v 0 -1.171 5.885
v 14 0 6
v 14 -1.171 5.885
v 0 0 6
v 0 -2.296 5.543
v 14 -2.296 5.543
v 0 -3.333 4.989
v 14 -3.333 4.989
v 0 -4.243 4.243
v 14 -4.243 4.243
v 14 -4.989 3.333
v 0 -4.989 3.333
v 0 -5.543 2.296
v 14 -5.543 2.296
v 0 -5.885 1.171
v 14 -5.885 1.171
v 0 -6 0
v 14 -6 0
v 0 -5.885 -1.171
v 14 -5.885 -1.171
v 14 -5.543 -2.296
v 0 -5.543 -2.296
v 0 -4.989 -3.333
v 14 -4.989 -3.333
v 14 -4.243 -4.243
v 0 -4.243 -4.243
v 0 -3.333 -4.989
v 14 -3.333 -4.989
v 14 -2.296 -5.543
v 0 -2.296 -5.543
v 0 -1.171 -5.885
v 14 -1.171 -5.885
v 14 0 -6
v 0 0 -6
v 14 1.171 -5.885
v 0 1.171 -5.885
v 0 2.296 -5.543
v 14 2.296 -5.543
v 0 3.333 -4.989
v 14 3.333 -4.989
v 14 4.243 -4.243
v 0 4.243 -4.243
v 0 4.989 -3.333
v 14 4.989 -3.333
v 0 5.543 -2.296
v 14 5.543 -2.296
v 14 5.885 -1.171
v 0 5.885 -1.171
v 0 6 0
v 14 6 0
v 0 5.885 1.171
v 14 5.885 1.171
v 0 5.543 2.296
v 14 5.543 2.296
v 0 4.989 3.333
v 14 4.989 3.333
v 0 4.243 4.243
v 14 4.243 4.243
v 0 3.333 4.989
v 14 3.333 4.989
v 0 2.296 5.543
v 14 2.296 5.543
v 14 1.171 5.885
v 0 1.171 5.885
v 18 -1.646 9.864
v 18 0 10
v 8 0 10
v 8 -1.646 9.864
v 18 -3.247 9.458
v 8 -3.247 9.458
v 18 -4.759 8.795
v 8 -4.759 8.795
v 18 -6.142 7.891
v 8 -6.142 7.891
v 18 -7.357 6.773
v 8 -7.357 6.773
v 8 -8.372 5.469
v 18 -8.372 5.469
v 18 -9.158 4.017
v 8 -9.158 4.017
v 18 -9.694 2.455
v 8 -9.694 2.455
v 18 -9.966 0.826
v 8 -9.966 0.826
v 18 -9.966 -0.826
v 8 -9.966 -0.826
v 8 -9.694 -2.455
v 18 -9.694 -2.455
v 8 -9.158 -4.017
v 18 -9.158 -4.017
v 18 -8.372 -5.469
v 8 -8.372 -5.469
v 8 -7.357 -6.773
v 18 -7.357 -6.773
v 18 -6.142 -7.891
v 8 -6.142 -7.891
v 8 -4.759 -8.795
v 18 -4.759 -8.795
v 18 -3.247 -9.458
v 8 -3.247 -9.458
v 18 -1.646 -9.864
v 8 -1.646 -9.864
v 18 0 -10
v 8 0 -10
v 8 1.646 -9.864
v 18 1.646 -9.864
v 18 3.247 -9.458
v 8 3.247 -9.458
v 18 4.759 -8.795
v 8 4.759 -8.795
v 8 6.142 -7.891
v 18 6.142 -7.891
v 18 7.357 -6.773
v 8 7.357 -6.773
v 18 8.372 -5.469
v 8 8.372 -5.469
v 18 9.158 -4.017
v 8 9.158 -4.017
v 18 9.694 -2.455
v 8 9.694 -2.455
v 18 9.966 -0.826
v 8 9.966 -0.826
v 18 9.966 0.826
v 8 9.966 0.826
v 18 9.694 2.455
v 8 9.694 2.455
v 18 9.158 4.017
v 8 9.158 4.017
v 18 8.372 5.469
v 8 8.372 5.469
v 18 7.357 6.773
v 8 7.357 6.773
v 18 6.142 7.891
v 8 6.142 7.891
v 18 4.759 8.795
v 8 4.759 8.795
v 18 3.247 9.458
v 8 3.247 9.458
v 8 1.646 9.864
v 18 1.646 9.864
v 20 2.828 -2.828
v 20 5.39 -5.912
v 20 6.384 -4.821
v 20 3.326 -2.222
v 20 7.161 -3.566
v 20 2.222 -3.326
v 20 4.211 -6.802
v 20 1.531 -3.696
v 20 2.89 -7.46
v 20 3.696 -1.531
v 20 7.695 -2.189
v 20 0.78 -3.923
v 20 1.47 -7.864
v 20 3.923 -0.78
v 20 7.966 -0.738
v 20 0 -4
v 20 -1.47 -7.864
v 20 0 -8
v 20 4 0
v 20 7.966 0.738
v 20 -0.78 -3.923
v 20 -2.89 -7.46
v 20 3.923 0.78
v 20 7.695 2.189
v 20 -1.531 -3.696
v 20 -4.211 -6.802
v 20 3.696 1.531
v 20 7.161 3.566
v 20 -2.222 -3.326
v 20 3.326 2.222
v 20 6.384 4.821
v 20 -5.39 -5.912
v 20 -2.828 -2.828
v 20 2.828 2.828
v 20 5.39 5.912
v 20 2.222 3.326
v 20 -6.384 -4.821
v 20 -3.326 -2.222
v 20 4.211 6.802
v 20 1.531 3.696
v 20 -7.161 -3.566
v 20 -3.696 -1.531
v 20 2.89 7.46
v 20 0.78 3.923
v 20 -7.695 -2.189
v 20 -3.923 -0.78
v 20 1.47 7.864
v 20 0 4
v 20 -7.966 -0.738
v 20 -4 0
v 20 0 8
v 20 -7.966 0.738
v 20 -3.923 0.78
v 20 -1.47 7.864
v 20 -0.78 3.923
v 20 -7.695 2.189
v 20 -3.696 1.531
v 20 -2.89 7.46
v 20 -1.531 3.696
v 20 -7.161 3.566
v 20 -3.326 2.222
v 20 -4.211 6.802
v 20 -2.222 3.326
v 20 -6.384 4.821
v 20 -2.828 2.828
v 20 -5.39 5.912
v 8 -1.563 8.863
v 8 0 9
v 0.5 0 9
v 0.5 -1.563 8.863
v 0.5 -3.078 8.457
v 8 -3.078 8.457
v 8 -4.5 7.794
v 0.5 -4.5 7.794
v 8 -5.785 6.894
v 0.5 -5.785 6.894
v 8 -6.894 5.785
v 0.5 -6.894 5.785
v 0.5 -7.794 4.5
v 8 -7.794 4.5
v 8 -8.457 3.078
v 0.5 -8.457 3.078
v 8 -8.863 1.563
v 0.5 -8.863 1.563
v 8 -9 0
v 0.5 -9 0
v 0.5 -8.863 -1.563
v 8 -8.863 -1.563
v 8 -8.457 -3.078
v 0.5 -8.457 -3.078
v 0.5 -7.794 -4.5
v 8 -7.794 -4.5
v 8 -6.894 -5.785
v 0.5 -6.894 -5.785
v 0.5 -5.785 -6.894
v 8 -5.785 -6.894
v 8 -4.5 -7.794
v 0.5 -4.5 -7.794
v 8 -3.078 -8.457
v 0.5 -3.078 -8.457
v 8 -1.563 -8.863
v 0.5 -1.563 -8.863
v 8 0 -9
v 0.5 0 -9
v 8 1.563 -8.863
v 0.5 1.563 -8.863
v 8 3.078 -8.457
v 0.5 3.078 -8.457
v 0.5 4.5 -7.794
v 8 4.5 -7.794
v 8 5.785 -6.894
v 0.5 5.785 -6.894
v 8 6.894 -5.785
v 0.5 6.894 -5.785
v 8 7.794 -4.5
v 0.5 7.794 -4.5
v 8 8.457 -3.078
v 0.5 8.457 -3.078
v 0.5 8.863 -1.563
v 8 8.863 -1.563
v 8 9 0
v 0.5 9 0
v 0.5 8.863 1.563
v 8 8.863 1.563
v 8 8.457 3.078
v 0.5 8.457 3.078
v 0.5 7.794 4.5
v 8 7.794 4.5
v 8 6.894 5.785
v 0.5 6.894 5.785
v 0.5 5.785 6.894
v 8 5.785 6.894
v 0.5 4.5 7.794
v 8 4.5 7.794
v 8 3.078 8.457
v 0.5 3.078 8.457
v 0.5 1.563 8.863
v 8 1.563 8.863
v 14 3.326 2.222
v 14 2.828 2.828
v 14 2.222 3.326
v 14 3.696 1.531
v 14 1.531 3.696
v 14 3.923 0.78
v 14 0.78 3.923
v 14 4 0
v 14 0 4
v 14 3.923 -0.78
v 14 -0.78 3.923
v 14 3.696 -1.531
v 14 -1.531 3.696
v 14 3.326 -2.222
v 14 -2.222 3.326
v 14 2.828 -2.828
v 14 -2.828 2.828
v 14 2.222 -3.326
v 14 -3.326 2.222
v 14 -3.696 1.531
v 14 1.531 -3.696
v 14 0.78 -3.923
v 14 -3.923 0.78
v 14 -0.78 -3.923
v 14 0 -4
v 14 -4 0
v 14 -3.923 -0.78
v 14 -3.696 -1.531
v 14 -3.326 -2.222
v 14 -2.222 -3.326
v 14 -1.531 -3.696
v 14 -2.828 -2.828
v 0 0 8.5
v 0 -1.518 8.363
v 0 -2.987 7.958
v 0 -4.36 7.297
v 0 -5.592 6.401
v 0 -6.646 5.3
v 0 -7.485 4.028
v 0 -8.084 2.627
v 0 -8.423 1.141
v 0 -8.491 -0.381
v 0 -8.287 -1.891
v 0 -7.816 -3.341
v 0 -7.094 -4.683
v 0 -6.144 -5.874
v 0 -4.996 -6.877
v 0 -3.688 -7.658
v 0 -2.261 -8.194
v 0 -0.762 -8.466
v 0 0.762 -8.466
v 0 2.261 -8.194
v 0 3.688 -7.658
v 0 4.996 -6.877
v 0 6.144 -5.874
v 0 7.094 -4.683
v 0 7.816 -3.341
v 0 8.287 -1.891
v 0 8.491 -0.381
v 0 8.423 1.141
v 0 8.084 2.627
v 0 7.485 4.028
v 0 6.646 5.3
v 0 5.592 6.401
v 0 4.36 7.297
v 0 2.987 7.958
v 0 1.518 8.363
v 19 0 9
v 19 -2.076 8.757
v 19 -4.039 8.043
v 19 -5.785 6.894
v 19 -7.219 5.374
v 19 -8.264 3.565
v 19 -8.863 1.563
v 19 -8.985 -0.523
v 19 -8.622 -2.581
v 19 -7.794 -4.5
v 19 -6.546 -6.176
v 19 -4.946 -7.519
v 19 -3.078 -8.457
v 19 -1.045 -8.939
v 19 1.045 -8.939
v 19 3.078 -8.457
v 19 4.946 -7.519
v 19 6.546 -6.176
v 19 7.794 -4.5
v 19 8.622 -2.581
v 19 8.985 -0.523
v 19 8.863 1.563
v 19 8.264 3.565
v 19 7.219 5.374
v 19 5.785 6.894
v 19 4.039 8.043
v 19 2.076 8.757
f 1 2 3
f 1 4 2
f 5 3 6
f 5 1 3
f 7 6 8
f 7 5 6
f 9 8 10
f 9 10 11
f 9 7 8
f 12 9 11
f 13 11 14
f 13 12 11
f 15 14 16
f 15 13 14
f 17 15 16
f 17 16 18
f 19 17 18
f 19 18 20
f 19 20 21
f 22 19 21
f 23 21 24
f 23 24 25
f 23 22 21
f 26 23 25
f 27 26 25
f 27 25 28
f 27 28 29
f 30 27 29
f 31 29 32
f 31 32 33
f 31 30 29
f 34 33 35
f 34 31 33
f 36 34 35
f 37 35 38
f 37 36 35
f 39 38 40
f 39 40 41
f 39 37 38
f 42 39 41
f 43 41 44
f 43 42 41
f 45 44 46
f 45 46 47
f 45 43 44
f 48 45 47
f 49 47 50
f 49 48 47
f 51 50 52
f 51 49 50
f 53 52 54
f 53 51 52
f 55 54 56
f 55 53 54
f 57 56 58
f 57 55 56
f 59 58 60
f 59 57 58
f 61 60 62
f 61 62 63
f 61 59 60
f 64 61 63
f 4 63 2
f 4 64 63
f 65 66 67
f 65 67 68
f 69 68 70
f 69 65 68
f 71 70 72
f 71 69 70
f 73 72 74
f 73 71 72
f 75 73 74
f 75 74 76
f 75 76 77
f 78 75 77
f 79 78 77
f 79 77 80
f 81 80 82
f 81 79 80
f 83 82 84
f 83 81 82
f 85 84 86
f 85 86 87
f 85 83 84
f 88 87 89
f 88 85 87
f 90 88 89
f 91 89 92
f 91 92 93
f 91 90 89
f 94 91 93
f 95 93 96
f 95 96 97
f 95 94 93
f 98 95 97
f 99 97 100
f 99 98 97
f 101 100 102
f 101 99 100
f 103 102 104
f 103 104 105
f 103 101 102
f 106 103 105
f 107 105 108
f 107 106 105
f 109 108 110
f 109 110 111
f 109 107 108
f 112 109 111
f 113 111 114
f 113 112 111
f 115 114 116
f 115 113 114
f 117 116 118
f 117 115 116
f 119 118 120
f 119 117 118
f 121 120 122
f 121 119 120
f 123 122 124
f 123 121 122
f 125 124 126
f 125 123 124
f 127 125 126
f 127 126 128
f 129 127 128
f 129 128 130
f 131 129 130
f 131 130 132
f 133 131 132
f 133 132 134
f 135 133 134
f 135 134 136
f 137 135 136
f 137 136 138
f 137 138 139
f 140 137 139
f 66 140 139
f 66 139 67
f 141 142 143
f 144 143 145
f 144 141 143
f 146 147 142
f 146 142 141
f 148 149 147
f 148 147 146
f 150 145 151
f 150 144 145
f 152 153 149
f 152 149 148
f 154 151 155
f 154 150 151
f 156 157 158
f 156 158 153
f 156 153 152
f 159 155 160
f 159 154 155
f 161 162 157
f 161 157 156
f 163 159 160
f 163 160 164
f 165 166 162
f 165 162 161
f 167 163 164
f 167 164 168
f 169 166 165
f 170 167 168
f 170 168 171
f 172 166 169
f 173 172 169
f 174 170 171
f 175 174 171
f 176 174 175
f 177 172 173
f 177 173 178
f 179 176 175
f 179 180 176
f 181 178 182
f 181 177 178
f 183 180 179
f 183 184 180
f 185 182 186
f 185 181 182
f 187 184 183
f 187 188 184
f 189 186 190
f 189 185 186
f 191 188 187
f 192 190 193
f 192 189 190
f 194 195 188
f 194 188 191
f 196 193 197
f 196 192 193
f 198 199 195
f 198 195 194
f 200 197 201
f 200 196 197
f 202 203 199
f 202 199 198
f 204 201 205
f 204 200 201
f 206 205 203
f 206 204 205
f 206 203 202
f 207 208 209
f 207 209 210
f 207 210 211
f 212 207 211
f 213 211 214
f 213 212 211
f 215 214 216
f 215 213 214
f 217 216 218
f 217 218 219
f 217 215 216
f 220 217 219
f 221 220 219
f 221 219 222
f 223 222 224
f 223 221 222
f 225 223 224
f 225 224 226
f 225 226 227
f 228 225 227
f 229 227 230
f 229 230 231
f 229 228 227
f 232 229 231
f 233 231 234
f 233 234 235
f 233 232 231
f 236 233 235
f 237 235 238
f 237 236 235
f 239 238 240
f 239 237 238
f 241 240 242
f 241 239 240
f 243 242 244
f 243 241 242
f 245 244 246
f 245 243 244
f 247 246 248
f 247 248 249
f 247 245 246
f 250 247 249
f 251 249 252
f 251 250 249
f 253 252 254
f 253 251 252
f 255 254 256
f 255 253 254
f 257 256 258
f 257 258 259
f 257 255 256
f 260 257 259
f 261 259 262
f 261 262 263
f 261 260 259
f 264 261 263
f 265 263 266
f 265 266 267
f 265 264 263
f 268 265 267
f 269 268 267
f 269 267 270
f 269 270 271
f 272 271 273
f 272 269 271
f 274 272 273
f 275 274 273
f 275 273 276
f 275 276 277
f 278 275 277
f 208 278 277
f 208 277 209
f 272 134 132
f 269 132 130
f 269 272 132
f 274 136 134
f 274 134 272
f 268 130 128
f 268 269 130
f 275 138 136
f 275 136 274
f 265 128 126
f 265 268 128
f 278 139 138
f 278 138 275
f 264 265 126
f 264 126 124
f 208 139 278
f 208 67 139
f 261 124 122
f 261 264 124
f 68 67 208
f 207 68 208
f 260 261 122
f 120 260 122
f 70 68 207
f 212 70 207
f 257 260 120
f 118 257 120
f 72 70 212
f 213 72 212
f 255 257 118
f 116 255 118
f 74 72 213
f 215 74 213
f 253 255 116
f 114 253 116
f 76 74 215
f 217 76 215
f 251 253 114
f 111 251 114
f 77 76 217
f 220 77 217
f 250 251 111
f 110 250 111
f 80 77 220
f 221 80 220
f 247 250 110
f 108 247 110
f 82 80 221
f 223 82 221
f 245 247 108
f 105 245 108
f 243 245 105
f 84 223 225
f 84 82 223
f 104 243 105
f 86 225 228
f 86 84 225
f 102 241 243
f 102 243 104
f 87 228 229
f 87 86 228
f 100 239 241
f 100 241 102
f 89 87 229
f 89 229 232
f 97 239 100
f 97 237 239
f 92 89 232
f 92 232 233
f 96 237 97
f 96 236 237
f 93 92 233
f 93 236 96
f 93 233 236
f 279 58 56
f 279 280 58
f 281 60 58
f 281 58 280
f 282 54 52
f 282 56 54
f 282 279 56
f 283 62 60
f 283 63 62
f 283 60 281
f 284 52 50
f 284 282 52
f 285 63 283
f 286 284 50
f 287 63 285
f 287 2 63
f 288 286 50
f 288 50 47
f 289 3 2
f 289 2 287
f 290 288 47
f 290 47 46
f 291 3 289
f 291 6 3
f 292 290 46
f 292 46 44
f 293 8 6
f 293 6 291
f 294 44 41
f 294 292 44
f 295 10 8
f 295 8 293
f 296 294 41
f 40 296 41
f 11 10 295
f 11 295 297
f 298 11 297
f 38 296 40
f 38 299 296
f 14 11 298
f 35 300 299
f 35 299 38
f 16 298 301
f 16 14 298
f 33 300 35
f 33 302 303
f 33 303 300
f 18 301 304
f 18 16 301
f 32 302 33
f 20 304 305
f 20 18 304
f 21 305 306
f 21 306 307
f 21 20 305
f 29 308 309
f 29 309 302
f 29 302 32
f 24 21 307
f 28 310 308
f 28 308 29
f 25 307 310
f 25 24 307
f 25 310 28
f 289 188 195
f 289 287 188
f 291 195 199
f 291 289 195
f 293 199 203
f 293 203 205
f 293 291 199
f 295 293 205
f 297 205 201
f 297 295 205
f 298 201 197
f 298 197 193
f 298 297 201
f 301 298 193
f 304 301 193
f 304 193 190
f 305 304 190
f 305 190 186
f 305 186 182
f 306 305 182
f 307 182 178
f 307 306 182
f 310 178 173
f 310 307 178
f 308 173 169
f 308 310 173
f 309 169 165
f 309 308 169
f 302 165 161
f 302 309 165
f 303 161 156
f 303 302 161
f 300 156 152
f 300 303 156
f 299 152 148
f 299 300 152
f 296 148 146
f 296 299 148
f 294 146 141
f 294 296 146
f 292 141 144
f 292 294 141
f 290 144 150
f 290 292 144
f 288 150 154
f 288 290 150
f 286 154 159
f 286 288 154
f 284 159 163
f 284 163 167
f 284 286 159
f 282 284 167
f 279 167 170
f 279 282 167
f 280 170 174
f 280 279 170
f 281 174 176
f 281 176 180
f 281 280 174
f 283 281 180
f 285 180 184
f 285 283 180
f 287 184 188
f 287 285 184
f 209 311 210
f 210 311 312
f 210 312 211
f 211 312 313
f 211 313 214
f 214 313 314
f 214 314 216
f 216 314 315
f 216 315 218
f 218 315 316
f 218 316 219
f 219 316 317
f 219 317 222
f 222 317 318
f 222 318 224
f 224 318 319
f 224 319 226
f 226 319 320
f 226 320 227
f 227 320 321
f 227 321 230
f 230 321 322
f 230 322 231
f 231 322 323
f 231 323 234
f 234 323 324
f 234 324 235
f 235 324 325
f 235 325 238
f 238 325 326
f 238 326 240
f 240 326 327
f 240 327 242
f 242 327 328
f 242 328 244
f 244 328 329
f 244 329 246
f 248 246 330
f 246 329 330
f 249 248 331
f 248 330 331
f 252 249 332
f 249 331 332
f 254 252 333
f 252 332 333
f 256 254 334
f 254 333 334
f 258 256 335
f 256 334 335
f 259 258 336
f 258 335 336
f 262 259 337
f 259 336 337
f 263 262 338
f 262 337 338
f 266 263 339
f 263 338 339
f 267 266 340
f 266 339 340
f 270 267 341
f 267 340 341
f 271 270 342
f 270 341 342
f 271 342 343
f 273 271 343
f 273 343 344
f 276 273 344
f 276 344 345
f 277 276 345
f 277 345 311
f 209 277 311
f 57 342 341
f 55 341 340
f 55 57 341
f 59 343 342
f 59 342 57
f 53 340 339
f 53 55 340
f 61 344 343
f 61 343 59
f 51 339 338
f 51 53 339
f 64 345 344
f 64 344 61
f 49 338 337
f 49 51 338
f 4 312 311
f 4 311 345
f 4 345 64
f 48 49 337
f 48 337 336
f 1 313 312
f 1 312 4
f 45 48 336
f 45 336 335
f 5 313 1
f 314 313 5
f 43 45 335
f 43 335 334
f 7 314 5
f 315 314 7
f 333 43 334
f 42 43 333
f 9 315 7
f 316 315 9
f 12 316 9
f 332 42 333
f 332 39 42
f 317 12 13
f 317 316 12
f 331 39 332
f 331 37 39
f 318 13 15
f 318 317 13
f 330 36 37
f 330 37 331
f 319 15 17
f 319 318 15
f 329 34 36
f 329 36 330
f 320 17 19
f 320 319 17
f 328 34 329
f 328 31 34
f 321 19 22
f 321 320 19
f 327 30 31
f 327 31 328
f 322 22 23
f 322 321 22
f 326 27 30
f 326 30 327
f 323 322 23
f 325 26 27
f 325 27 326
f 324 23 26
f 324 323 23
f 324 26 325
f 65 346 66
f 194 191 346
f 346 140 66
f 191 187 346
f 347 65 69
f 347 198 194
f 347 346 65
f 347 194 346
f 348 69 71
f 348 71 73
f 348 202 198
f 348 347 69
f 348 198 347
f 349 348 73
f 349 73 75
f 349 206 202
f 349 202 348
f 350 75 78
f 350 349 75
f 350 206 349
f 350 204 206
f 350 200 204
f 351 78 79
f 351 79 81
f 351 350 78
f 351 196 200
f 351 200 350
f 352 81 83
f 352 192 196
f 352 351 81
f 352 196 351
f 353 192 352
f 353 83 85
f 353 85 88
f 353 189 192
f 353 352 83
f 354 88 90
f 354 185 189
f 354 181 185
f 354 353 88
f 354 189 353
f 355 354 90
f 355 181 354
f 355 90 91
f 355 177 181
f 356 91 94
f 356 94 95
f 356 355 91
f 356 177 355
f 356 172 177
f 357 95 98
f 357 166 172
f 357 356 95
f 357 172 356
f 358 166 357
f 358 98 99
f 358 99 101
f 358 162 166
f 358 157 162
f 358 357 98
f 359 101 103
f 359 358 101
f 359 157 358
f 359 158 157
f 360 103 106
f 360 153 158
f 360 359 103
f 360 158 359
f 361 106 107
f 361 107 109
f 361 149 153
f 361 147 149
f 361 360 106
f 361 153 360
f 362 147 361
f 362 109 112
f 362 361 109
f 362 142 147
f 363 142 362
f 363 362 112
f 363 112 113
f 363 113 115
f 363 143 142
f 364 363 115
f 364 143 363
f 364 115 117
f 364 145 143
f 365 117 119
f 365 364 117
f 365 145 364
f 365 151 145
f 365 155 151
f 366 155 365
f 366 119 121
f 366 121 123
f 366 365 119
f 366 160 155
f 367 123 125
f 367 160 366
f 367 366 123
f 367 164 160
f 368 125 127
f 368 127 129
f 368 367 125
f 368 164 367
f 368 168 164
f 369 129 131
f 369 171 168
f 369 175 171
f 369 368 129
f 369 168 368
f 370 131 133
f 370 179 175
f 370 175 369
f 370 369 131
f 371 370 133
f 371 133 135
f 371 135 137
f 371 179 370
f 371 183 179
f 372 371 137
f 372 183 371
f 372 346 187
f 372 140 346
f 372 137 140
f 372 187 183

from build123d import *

# Parameters (mm, degrees)
CHANFREIN1_SIZE = 2
CHANFREIN2_SIZE = 0.5


with BuildPart() as part:
    # Esquisse1 → Base-Révolution (revolve)
    with BuildSketch(Plane.XY, mode=Mode.PRIVATE) as base_r_volution_sk:
        Polygon((0, 6), (0, 9), (8, 9), (8, 10), (20, 10), (20, 4), (14, 4), (14, 6), align=None)
    revolve(base_r_volution_sk.sketch.rotate(Axis((0, 0, 0), (1, 0, 0)), 90), axis=Axis((0, 0, 0), (1, 0, 0)))

    # Chanfrein1
    chanfrein1_edges = [part.edges().sort_by_distance(p)[0] for p in [
        (20, 0, -10),
    ]]
    chamfer(chanfrein1_edges, length=CHANFREIN1_SIZE)

    # Chanfrein2
    chanfrein2_edges = [part.edges().sort_by_distance(p)[0] for p in [
        (0, 0, -9),
    ]]
    chamfer(chanfrein2_edges, length=CHANFREIN2_SIZE)


solid = part.part
